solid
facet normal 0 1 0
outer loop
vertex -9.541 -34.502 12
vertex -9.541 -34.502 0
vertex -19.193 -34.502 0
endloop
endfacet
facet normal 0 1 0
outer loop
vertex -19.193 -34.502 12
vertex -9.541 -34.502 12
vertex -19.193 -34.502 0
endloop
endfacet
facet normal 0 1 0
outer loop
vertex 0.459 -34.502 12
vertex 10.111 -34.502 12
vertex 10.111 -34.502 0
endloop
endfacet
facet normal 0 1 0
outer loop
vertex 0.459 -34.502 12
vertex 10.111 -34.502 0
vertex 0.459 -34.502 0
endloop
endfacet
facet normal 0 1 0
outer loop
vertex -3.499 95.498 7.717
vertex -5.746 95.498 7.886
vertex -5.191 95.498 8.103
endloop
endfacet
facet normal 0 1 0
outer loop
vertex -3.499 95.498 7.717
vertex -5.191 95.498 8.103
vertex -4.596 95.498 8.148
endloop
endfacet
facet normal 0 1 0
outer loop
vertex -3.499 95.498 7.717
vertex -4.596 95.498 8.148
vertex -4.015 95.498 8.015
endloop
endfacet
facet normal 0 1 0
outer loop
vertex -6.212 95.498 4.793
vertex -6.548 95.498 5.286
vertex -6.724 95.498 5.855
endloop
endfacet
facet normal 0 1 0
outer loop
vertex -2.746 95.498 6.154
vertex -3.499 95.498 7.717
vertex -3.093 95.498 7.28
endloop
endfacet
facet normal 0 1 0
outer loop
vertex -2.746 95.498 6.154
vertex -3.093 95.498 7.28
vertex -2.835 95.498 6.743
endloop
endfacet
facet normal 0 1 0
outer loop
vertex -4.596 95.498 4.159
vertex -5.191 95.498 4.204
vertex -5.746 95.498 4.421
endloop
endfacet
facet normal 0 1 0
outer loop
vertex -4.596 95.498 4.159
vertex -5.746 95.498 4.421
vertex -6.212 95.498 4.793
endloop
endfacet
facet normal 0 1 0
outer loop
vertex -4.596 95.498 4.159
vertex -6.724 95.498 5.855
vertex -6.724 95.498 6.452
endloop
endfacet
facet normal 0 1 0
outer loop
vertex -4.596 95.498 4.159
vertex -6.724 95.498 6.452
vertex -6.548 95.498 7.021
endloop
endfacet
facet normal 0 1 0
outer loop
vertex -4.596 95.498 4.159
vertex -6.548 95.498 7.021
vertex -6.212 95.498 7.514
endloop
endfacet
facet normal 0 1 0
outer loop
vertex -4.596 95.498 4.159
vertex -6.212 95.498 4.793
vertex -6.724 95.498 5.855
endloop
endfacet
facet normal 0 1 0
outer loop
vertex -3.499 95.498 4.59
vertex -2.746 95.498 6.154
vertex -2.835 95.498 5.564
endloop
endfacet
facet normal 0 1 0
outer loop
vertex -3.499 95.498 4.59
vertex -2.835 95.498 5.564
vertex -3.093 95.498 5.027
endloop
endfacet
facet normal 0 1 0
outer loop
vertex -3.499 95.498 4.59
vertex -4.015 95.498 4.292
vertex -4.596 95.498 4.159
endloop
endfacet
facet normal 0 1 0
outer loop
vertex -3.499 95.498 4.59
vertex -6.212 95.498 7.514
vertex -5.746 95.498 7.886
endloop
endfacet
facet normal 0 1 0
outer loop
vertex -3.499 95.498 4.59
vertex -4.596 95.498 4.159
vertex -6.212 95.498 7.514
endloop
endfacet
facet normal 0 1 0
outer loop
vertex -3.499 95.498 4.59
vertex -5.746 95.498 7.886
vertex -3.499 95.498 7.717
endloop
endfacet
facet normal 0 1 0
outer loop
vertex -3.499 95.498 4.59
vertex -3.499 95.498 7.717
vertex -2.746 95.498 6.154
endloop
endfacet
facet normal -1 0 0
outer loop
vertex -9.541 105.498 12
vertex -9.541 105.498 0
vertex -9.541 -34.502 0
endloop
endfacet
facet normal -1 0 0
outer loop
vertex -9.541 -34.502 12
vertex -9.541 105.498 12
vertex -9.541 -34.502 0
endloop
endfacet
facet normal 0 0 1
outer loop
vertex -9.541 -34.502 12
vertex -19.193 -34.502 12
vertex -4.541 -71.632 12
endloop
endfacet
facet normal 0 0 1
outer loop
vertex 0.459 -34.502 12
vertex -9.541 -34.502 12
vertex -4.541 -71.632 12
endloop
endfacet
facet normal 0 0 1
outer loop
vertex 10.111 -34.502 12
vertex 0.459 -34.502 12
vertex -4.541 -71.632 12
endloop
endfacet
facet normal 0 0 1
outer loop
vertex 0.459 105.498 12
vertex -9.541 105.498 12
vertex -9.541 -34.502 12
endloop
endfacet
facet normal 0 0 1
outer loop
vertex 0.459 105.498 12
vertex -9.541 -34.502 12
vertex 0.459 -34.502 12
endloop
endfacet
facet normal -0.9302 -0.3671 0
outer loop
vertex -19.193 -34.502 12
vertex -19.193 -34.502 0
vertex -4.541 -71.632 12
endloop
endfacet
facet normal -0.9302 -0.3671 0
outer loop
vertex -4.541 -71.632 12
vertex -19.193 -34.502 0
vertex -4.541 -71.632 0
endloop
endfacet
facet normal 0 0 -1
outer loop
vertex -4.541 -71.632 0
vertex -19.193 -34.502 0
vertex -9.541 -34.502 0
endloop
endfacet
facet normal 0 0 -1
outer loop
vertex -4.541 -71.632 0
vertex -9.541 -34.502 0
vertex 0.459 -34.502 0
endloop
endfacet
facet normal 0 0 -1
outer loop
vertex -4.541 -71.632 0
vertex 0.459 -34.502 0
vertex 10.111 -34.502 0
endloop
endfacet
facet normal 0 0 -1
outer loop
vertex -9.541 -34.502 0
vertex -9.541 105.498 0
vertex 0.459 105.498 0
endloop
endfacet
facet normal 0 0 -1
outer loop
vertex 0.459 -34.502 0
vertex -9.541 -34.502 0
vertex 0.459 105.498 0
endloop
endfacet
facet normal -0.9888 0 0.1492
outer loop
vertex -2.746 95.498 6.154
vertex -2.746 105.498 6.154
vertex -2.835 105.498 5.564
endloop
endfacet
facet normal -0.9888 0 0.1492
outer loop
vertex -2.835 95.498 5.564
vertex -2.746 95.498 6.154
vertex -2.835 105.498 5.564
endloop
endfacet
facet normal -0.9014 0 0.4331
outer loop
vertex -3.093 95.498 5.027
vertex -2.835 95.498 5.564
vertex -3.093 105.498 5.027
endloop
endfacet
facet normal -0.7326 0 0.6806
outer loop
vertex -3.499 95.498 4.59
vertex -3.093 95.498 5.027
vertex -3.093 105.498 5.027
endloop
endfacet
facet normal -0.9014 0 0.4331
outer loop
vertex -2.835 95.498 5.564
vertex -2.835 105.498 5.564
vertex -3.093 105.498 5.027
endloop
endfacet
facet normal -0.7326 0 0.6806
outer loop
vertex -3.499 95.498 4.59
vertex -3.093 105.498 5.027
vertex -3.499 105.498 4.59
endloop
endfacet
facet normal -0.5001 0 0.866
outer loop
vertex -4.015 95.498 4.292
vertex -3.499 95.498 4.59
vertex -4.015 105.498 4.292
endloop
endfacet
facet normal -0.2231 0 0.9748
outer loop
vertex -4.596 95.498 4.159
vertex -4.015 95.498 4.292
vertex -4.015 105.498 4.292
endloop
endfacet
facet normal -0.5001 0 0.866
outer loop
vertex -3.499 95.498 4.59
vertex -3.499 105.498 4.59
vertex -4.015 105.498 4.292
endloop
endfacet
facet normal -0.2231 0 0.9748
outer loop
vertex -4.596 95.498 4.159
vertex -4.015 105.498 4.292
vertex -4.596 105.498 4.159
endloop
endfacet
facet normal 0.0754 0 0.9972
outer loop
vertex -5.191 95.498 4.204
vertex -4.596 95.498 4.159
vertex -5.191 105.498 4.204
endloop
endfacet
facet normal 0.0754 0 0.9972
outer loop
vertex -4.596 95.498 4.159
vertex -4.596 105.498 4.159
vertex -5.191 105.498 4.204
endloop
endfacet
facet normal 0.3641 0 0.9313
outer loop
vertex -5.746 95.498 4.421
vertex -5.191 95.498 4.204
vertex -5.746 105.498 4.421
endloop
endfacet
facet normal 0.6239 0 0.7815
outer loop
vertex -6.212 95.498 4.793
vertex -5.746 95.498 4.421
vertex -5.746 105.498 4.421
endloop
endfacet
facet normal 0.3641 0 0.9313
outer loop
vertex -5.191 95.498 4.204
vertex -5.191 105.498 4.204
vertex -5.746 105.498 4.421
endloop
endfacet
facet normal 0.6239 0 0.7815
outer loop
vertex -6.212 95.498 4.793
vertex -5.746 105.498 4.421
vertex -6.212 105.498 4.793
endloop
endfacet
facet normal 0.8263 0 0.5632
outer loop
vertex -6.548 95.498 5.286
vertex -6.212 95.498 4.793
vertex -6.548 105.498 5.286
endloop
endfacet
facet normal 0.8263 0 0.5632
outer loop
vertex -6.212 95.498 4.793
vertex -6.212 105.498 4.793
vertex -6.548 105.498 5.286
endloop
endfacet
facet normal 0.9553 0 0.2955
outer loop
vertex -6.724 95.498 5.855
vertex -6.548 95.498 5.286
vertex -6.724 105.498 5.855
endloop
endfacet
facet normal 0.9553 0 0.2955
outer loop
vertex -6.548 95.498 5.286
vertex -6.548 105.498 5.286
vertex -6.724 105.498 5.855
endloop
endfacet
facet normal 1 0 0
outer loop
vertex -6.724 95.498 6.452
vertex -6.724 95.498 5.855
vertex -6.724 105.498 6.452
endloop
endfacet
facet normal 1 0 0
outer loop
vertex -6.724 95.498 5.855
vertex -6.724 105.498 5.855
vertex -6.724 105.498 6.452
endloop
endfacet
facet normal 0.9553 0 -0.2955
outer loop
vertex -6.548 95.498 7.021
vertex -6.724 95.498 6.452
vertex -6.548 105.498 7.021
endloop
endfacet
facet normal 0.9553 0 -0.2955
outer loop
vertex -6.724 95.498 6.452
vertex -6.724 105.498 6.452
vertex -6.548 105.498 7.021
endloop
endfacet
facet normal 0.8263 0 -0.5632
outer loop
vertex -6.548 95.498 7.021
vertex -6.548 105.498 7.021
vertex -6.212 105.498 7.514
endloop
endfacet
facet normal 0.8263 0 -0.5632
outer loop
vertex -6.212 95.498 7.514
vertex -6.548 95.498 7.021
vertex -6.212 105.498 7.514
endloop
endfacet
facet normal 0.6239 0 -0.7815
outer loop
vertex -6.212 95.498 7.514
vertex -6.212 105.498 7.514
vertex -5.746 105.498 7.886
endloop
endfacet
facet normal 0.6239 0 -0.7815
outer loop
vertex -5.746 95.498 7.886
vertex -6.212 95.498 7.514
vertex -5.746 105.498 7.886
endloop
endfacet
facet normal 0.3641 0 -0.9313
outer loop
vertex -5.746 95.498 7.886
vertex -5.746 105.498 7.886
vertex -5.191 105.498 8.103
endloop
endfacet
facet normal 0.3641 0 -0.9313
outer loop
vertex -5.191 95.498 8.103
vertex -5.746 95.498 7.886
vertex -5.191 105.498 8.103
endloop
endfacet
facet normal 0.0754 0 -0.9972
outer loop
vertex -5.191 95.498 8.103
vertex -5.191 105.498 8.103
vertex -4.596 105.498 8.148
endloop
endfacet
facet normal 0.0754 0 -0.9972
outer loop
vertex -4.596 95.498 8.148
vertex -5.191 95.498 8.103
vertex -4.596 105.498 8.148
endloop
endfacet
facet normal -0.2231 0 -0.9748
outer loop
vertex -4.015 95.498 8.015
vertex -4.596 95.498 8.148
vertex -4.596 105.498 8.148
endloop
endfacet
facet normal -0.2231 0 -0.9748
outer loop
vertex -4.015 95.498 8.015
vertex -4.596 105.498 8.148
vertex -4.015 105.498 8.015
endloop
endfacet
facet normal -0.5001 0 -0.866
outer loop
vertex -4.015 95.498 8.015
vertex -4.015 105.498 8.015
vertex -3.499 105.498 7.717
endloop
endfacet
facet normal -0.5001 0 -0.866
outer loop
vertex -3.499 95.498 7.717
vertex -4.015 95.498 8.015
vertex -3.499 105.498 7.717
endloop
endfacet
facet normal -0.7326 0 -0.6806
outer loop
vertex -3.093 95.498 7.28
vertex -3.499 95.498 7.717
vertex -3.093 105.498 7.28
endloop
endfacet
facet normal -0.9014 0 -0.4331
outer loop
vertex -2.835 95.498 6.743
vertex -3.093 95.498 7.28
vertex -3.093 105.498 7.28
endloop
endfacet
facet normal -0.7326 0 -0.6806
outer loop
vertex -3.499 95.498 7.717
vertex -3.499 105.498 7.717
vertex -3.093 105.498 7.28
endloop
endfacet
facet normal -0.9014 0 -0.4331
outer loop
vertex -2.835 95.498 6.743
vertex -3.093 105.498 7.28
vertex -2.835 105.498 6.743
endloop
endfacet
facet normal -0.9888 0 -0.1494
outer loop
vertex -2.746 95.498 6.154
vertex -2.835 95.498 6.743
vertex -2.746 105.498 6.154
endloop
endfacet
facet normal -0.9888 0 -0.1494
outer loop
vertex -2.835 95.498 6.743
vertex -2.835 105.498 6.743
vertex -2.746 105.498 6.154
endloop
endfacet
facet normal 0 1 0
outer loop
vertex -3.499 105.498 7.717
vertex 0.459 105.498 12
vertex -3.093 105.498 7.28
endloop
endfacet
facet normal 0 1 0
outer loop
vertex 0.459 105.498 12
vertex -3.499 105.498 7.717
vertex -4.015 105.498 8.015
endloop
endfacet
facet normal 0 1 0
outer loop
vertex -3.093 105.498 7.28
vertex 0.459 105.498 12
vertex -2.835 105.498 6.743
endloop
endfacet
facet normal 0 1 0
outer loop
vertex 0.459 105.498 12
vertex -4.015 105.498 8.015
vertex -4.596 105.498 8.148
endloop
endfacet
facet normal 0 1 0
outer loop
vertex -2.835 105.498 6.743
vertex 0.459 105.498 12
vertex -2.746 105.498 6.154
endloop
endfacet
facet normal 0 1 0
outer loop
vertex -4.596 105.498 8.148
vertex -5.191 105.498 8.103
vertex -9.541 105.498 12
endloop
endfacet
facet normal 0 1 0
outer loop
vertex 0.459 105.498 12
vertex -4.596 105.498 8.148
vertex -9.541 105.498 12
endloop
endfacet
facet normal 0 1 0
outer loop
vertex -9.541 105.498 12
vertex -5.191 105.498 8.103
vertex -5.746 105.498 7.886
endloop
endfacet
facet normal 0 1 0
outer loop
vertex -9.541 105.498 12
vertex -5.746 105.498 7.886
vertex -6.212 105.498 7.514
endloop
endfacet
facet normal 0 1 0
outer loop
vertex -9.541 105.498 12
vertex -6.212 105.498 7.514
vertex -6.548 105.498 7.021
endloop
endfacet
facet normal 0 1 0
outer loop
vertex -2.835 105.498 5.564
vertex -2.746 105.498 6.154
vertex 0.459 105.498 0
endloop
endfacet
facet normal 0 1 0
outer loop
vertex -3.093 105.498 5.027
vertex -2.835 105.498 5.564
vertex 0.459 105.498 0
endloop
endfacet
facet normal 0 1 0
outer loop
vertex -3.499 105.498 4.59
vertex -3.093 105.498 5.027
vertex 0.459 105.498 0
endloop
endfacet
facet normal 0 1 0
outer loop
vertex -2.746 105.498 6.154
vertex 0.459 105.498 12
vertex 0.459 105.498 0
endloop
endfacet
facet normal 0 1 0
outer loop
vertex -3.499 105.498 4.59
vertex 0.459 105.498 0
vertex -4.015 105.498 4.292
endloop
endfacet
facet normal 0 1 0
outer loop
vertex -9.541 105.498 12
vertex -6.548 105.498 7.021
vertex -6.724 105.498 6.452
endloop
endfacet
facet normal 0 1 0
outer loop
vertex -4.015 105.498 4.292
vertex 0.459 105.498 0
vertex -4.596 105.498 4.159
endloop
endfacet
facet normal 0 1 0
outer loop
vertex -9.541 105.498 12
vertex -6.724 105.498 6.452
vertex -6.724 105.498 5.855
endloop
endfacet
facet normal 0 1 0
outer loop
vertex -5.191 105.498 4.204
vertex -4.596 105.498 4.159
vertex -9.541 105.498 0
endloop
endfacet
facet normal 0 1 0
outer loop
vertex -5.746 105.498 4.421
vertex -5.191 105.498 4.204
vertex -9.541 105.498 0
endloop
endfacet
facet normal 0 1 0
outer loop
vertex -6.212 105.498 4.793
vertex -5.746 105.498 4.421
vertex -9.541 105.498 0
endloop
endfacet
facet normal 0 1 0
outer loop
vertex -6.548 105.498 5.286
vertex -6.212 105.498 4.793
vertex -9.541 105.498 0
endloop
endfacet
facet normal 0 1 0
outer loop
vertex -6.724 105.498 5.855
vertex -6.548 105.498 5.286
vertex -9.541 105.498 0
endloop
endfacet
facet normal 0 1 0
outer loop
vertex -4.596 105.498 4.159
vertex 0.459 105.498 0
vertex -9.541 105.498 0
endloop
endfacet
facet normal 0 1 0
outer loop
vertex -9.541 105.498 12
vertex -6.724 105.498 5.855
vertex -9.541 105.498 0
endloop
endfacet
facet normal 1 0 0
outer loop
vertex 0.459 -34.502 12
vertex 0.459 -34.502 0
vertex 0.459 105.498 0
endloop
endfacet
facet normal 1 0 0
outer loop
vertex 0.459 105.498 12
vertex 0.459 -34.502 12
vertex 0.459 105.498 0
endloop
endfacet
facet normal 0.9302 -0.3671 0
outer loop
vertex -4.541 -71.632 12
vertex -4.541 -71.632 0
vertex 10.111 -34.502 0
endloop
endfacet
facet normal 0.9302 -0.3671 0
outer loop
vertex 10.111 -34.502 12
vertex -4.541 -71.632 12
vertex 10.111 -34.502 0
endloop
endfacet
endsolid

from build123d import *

# Parameters (mm, degrees)
BOSS_EXTRUDE1_DEPTH = 12
SKETCH2_R           = 2
CUT_EXTRUDE1_DEPTH  = 10


with BuildPart() as part:
    # Sketch1 → Boss-Extrude1 (new body)
    with BuildSketch(Plane.XY):
        Polygon((-9.541165506, 105.498159978), (-9.541165506, 95.498159978), (-9.541165506, -34.501840022), (-19.192936941, -34.501840022), (-4.541165506, -71.632080767), (10.110605928, -34.501840022), (0.458834494, -34.501840022), (0.458834494, 95.498159978), (0.458834494, 105.498159978), align=None)
    extrude(amount=BOSS_EXTRUDE1_DEPTH)

    # Sketch2 → Cut-Extrude1 (cut)
    with BuildSketch(Plane(origin=(0, 105.498159978, 0), x_dir=(1, 0, 0), z_dir=(0, 1, 0))):
        with Locations((-4.745886353, -6.153540635)):
            Circle(SKETCH2_R)
    extrude(amount=-CUT_EXTRUDE1_DEPTH, mode=Mode.SUBTRACT)


solid = part.part
